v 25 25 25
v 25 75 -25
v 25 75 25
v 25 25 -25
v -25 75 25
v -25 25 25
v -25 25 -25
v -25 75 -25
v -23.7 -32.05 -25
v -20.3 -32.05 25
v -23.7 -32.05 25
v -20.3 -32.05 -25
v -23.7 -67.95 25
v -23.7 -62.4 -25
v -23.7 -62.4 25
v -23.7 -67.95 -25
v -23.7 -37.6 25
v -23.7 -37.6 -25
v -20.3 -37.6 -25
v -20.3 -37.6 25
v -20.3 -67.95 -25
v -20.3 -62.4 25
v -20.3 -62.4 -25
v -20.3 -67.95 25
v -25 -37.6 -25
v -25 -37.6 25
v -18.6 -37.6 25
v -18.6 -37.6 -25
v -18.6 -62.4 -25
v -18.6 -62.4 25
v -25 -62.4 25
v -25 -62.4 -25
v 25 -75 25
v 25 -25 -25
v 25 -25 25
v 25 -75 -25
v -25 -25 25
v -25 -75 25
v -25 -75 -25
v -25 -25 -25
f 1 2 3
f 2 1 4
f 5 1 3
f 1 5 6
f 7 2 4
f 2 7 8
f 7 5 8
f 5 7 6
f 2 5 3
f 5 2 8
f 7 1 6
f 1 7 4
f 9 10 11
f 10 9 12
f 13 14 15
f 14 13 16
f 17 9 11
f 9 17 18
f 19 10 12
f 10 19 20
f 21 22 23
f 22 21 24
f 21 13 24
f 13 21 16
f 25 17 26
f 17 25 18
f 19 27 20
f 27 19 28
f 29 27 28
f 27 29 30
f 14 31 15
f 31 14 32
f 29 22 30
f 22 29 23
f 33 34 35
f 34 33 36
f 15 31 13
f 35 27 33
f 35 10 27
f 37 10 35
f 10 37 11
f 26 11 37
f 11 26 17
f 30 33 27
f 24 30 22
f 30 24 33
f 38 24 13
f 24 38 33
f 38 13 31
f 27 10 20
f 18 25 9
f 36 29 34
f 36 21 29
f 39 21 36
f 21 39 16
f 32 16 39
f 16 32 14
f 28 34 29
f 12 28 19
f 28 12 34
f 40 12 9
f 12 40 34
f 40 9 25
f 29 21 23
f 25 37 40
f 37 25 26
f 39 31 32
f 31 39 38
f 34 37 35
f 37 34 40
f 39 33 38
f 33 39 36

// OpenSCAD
// file: ../Fasteners/Screws/High_Low_Screw_Vitamin.scad
function HiLoScrewDiameter(3dPrinterTolerance=.4)= 3.6+3dPrinterTolerance;  
function HiLoScrewLength(3dPrinterTolerance=.4)= 22+3dPrinterTolerance;
function HiLoScrewHeadDiameter(3dPrinterTolerance=.4)= 6.7+3dPrinterTolerance;
function HiLoScrewHeadHeight(3dPrinterTolerance=.4)= 2.5+3dPrinterTolerance;

//err on the side of smaller tolerances for screws

module HiLoScrew(3dPrinterTolerance=.4)
{
	union()
	{
		translate([0,0,-HiLoScrewLength(3dPrinterTolerance)])
		{
			cylinder(HiLoScrewLength(3dPrinterTolerance), HiLoScrewDiameter(3dPrinterTolerance)/2, HiLoScrewDiameter(3dPrinterTolerance)/2);
		}
		cylinder(HiLoScrewHeadHeight(3dPrinterTolerance), HiLoScrewHeadDiameter(3dPrinterTolerance)/2,HiLoScrewHeadDiameter(3dPrinterTolerance)/2);
	}
}

HiLoScrew();
// file: ../Sensors/Encoders/Encoder_Vitamin.scad
use <../../Fasteners/Screws/High_Low_Screw_Vitamin.scad>

function EncoderWidth(3dPrinterTolerance=.4)=35.5+ 3dPrinterTolerance;
function EncoderHeight(3dPrinterTolerance=.4)=25+ 3dPrinterTolerance;
function EncoderThickness(3dPrinterTolerance=.4)=3+ 3dPrinterTolerance;

function EncoderBoltWidth(3dPrinterTolerance=.4)=3+ 3dPrinterTolerance;
function EncoderBoltLength(3dPrinterTolerance=.4)=20+ 3dPrinterTolerance;
function EncoderBoltInsetY(3dPrinterTolerance=.4)=2.2+ 3dPrinterTolerance/2;
function EncoderBoltInsetX(3dPrinterTolerance=.4)=4.5+ 3dPrinterTolerance/2;

function EncoderLongBoxWidth(3dPrinterTolerance=.4)=9+ 3dPrinterTolerance;

function EncoderShortBoxWidth(3dPrinterTolerance=.4)=10+ 3dPrinterTolerance;
function EncoderShortBoxLength(3dPrinterTolerance=.4)=13.5+ 3dPrinterTolerance;
function EncoderShortBoxInset(3dPrinterTolerance=.4)=7+ 3dPrinterTolerance/2;

function EncoderBoxHeight(3dPrinterTolerance=.4)=9+EncoderThickness()+ 3dPrinterTolerance;

function EncoderChipSide(3dPrinterTolerance=.4)=4.25+ 3dPrinterTolerance;
function EncoderChipHeight(3dPrinterTolerance=.4)= 1+ 3dPrinterTolerance;
function EncoderChipOffset(3dPrinterTolerance=.4)=4+ 3dPrinterTolerance/2;

//this sort of forces the HiLo screw down so it is closer to the encoder and the encoder doesn't wiggle as much, feel free to change to 0 if you don't want it.
function HiLoOffset()=1.5;

module Encoder(Bolts=true, 3dPrinterTolerance=.4)
{
	//centers the encoder on the chip, which is the important part
	translate([-EncoderWidth(3dPrinterTolerance)/2,-EncoderChipOffset(3dPrinterTolerance)-EncoderChipSide(3dPrinterTolerance)/2,0])
	{
		union()
		{
	//base
			cube([EncoderWidth(3dPrinterTolerance), EncoderHeight(3dPrinterTolerance), EncoderThickness(3dPrinterTolerance)]);
	//chip
			translate([EncoderWidth(3dPrinterTolerance)/2-EncoderChipSide(3dPrinterTolerance)/2, EncoderChipOffset(3dPrinterTolerance), -EncoderChipHeight(3dPrinterTolerance)])
			{
				cube([EncoderChipSide(3dPrinterTolerance), EncoderChipSide(3dPrinterTolerance),EncoderChipHeight(3dPrinterTolerance)]);
			}
	//boxes
			translate([EncoderShortBoxInset(3dPrinterTolerance)+EncoderShortBoxWidth(3dPrinterTolerance),0,0])
			{
				cube([EncoderLongBoxWidth(3dPrinterTolerance), EncoderHeight(3dPrinterTolerance), EncoderBoxHeight(3dPrinterTolerance)]);
			}
			translate([EncoderShortBoxInset(3dPrinterTolerance),EncoderHeight(3dPrinterTolerance)-EncoderShortBoxLength(3dPrinterTolerance),0])
			{ 
				cube([EncoderShortBoxWidth(3dPrinterTolerance), EncoderShortBoxLength(3dPrinterTolerance), EncoderBoxHeight(3dPrinterTolerance)]);
			}
if(Bolts==true)
	{
	//screws
			translate([EncoderBoltInsetX(3dPrinterTolerance),EncoderBoltInsetY(3dPrinterTolerance),-EncoderBoltLength(3dPrinterTolerance)/2])
			{
				cylinder(EncoderBoltLength(3dPrinterTolerance), EncoderBoltWidth(3dPrinterTolerance)/2, EncoderBoltWidth(3dPrinterTolerance)/2);
			}
			translate([EncoderWidth(3dPrinterTolerance)-EncoderBoltInsetX(3dPrinterTolerance),EncoderBoltInsetY(3dPrinterTolerance),-EncoderBoltLength(3dPrinterTolerance)/2])
			{
				cylinder(EncoderBoltLength(3dPrinterTolerance), EncoderBoltWidth(3dPrinterTolerance)/2, EncoderBoltWidth(3dPrinterTolerance)/2);
			}
			translate([EncoderBoltInsetX(3dPrinterTolerance),EncoderHeight(3dPrinterTolerance)-EncoderBoltInsetY(3dPrinterTolerance),-EncoderBoltLength(3dPrinterTolerance)/2])
			{
				cylinder(EncoderBoltLength(3dPrinterTolerance), EncoderBoltWidth(3dPrinterTolerance)/2, EncoderBoltWidth(3dPrinterTolerance)/2);
			}
			translate([EncoderWidth(3dPrinterTolerance)-EncoderBoltInsetX(3dPrinterTolerance),EncoderHeight(3dPrinterTolerance)-EncoderBoltInsetY(3dPrinterTolerance),-EncoderBoltLength(3dPrinterTolerance)/2])
			{
				cylinder(EncoderBoltLength(3dPrinterTolerance), EncoderBoltWidth(3dPrinterTolerance)/2, EncoderBoltWidth(3dPrinterTolerance)/2);
			}
	}else{}
		}
	}
}

//This is the encoder, complete with its encoder bolts (though bolts can be removed by changing the boolean to "false". It is shown in red.
translate([0,0,0])
{
	//color("Red")
	Encoder(true);
}


module Encoder_Keepaway(HiLo=true, 3dPrinterTolerance=.4)
{
	union()
	{
		Encoder(3dPrinterTolerance);
		translate([-EncoderWidth(3dPrinterTolerance)/2, -EncoderHeight(3dPrinterTolerance)+EncoderChipOffset(3dPrinterTolerance), 0])
		{
			cube([EncoderWidth(3dPrinterTolerance),EncoderThickness(3dPrinterTolerance)*8, EncoderThickness(3dPrinterTolerance)]);
		}
		translate([-(EncoderLongBoxWidth(3dPrinterTolerance)+EncoderShortBoxWidth(3dPrinterTolerance))/2-1,-(EncoderHeight(3dPrinterTolerance)+EncoderThickness(3dPrinterTolerance)*8)/2-1,0])
		{
			cube([EncoderLongBoxWidth(3dPrinterTolerance)+EncoderShortBoxWidth(3dPrinterTolerance)+1,EncoderHeight(3dPrinterTolerance)+EncoderThickness(3dPrinterTolerance)*16,EncoderHeight(3dPrinterTolerance)]);
		}
		//screws
		if(HiLo==true)
		{
			translate([-EncoderWidth()/2+EncoderThickness(),-EncoderChipOffset(3dPrinterTolerance)-EncoderThickness(3dPrinterTolerance)*1.2-3dPrinterTolerance+HiLoOffset(),EncoderBoltLength(3dPrinterTolerance)/2])

			{
				#HiLoScrew(3dPrinterTolerance-.05);
			}
			translate([EncoderWidth()/2-EncoderThickness(),-EncoderChipOffset(3dPrinterTolerance)-EncoderThickness(3dPrinterTolerance)*1.2-3dPrinterTolerance+HiLoOffset(),EncoderBoltLength(3dPrinterTolerance)/2])		
			{
				#HiLoScrew(3dPrinterTolerance-.05);
			}
		}else{}
	}
}

//This is the encoder with a keepaway, this is done so that you can fit the encoder into a slot, and use HiLo screws to hold it in, rather than purchasing the specific encoder bolts.
translate([50,0,0])
{
	union()
	{
		//Encoder(false);
		//%Encoder_Keepaway(true);
	}
}
// main file
//Sometimes it might be necessary to make a slot that a vitamin can fit into

//For example, let's make a slot for the encoder.

use <../Sensors/Encoders/Encoder_Vitamin.scad>

module EncoderBoxNoSlot()
{
	difference()
	{
		cube(size=[50,50,50], center=true);
		translate([-20,0,0])
		{
			rotate([-90,0,90])
			{
				%Encoder();
			}
		}
	}
}

//if the encoder is introduced with no slot, then there would be no way to get it into the hole that it is meant to occupy (shown in red).

translate([0,50,0])
{
	color("Red")
	EncoderBoxNoSlot();
}

//If we make the encoder box effectively larger, we can make a larger cutout and create a slot for the user to slide the encoder in before securing it


module EncoderBoxSlot()
{
	difference()
	{
		cube(size=[50,50,50], center=true);
		translate([-20,0,0])
		{
			rotate([-90,0,90])
			{
				union()
				{
					%Encoder();
//note how I can pull the encoder dimensions from my encoder file, making a slot exactly the size of the encoder. This is the major benefit of doing "use" and pulling in .scad files, over "include" with .stl files.
					translate([0,0,2])
					{
						cube(size=[EncoderWidth(), 51, EncoderThickness()], center=true);
					}
					translate([0,0,5])
					{
						cube(size=[EncoderLongBoxWidth()+EncoderShortBoxWidth()+5, 51, EncoderBoxHeight()], center=true);
					}
				}
			}
		}
	}
}

//Here is the encoder complete with slot, shown in blue.
translate([0,-50,0])
{
	color("Blue")
	EncoderBoxSlot();
}
